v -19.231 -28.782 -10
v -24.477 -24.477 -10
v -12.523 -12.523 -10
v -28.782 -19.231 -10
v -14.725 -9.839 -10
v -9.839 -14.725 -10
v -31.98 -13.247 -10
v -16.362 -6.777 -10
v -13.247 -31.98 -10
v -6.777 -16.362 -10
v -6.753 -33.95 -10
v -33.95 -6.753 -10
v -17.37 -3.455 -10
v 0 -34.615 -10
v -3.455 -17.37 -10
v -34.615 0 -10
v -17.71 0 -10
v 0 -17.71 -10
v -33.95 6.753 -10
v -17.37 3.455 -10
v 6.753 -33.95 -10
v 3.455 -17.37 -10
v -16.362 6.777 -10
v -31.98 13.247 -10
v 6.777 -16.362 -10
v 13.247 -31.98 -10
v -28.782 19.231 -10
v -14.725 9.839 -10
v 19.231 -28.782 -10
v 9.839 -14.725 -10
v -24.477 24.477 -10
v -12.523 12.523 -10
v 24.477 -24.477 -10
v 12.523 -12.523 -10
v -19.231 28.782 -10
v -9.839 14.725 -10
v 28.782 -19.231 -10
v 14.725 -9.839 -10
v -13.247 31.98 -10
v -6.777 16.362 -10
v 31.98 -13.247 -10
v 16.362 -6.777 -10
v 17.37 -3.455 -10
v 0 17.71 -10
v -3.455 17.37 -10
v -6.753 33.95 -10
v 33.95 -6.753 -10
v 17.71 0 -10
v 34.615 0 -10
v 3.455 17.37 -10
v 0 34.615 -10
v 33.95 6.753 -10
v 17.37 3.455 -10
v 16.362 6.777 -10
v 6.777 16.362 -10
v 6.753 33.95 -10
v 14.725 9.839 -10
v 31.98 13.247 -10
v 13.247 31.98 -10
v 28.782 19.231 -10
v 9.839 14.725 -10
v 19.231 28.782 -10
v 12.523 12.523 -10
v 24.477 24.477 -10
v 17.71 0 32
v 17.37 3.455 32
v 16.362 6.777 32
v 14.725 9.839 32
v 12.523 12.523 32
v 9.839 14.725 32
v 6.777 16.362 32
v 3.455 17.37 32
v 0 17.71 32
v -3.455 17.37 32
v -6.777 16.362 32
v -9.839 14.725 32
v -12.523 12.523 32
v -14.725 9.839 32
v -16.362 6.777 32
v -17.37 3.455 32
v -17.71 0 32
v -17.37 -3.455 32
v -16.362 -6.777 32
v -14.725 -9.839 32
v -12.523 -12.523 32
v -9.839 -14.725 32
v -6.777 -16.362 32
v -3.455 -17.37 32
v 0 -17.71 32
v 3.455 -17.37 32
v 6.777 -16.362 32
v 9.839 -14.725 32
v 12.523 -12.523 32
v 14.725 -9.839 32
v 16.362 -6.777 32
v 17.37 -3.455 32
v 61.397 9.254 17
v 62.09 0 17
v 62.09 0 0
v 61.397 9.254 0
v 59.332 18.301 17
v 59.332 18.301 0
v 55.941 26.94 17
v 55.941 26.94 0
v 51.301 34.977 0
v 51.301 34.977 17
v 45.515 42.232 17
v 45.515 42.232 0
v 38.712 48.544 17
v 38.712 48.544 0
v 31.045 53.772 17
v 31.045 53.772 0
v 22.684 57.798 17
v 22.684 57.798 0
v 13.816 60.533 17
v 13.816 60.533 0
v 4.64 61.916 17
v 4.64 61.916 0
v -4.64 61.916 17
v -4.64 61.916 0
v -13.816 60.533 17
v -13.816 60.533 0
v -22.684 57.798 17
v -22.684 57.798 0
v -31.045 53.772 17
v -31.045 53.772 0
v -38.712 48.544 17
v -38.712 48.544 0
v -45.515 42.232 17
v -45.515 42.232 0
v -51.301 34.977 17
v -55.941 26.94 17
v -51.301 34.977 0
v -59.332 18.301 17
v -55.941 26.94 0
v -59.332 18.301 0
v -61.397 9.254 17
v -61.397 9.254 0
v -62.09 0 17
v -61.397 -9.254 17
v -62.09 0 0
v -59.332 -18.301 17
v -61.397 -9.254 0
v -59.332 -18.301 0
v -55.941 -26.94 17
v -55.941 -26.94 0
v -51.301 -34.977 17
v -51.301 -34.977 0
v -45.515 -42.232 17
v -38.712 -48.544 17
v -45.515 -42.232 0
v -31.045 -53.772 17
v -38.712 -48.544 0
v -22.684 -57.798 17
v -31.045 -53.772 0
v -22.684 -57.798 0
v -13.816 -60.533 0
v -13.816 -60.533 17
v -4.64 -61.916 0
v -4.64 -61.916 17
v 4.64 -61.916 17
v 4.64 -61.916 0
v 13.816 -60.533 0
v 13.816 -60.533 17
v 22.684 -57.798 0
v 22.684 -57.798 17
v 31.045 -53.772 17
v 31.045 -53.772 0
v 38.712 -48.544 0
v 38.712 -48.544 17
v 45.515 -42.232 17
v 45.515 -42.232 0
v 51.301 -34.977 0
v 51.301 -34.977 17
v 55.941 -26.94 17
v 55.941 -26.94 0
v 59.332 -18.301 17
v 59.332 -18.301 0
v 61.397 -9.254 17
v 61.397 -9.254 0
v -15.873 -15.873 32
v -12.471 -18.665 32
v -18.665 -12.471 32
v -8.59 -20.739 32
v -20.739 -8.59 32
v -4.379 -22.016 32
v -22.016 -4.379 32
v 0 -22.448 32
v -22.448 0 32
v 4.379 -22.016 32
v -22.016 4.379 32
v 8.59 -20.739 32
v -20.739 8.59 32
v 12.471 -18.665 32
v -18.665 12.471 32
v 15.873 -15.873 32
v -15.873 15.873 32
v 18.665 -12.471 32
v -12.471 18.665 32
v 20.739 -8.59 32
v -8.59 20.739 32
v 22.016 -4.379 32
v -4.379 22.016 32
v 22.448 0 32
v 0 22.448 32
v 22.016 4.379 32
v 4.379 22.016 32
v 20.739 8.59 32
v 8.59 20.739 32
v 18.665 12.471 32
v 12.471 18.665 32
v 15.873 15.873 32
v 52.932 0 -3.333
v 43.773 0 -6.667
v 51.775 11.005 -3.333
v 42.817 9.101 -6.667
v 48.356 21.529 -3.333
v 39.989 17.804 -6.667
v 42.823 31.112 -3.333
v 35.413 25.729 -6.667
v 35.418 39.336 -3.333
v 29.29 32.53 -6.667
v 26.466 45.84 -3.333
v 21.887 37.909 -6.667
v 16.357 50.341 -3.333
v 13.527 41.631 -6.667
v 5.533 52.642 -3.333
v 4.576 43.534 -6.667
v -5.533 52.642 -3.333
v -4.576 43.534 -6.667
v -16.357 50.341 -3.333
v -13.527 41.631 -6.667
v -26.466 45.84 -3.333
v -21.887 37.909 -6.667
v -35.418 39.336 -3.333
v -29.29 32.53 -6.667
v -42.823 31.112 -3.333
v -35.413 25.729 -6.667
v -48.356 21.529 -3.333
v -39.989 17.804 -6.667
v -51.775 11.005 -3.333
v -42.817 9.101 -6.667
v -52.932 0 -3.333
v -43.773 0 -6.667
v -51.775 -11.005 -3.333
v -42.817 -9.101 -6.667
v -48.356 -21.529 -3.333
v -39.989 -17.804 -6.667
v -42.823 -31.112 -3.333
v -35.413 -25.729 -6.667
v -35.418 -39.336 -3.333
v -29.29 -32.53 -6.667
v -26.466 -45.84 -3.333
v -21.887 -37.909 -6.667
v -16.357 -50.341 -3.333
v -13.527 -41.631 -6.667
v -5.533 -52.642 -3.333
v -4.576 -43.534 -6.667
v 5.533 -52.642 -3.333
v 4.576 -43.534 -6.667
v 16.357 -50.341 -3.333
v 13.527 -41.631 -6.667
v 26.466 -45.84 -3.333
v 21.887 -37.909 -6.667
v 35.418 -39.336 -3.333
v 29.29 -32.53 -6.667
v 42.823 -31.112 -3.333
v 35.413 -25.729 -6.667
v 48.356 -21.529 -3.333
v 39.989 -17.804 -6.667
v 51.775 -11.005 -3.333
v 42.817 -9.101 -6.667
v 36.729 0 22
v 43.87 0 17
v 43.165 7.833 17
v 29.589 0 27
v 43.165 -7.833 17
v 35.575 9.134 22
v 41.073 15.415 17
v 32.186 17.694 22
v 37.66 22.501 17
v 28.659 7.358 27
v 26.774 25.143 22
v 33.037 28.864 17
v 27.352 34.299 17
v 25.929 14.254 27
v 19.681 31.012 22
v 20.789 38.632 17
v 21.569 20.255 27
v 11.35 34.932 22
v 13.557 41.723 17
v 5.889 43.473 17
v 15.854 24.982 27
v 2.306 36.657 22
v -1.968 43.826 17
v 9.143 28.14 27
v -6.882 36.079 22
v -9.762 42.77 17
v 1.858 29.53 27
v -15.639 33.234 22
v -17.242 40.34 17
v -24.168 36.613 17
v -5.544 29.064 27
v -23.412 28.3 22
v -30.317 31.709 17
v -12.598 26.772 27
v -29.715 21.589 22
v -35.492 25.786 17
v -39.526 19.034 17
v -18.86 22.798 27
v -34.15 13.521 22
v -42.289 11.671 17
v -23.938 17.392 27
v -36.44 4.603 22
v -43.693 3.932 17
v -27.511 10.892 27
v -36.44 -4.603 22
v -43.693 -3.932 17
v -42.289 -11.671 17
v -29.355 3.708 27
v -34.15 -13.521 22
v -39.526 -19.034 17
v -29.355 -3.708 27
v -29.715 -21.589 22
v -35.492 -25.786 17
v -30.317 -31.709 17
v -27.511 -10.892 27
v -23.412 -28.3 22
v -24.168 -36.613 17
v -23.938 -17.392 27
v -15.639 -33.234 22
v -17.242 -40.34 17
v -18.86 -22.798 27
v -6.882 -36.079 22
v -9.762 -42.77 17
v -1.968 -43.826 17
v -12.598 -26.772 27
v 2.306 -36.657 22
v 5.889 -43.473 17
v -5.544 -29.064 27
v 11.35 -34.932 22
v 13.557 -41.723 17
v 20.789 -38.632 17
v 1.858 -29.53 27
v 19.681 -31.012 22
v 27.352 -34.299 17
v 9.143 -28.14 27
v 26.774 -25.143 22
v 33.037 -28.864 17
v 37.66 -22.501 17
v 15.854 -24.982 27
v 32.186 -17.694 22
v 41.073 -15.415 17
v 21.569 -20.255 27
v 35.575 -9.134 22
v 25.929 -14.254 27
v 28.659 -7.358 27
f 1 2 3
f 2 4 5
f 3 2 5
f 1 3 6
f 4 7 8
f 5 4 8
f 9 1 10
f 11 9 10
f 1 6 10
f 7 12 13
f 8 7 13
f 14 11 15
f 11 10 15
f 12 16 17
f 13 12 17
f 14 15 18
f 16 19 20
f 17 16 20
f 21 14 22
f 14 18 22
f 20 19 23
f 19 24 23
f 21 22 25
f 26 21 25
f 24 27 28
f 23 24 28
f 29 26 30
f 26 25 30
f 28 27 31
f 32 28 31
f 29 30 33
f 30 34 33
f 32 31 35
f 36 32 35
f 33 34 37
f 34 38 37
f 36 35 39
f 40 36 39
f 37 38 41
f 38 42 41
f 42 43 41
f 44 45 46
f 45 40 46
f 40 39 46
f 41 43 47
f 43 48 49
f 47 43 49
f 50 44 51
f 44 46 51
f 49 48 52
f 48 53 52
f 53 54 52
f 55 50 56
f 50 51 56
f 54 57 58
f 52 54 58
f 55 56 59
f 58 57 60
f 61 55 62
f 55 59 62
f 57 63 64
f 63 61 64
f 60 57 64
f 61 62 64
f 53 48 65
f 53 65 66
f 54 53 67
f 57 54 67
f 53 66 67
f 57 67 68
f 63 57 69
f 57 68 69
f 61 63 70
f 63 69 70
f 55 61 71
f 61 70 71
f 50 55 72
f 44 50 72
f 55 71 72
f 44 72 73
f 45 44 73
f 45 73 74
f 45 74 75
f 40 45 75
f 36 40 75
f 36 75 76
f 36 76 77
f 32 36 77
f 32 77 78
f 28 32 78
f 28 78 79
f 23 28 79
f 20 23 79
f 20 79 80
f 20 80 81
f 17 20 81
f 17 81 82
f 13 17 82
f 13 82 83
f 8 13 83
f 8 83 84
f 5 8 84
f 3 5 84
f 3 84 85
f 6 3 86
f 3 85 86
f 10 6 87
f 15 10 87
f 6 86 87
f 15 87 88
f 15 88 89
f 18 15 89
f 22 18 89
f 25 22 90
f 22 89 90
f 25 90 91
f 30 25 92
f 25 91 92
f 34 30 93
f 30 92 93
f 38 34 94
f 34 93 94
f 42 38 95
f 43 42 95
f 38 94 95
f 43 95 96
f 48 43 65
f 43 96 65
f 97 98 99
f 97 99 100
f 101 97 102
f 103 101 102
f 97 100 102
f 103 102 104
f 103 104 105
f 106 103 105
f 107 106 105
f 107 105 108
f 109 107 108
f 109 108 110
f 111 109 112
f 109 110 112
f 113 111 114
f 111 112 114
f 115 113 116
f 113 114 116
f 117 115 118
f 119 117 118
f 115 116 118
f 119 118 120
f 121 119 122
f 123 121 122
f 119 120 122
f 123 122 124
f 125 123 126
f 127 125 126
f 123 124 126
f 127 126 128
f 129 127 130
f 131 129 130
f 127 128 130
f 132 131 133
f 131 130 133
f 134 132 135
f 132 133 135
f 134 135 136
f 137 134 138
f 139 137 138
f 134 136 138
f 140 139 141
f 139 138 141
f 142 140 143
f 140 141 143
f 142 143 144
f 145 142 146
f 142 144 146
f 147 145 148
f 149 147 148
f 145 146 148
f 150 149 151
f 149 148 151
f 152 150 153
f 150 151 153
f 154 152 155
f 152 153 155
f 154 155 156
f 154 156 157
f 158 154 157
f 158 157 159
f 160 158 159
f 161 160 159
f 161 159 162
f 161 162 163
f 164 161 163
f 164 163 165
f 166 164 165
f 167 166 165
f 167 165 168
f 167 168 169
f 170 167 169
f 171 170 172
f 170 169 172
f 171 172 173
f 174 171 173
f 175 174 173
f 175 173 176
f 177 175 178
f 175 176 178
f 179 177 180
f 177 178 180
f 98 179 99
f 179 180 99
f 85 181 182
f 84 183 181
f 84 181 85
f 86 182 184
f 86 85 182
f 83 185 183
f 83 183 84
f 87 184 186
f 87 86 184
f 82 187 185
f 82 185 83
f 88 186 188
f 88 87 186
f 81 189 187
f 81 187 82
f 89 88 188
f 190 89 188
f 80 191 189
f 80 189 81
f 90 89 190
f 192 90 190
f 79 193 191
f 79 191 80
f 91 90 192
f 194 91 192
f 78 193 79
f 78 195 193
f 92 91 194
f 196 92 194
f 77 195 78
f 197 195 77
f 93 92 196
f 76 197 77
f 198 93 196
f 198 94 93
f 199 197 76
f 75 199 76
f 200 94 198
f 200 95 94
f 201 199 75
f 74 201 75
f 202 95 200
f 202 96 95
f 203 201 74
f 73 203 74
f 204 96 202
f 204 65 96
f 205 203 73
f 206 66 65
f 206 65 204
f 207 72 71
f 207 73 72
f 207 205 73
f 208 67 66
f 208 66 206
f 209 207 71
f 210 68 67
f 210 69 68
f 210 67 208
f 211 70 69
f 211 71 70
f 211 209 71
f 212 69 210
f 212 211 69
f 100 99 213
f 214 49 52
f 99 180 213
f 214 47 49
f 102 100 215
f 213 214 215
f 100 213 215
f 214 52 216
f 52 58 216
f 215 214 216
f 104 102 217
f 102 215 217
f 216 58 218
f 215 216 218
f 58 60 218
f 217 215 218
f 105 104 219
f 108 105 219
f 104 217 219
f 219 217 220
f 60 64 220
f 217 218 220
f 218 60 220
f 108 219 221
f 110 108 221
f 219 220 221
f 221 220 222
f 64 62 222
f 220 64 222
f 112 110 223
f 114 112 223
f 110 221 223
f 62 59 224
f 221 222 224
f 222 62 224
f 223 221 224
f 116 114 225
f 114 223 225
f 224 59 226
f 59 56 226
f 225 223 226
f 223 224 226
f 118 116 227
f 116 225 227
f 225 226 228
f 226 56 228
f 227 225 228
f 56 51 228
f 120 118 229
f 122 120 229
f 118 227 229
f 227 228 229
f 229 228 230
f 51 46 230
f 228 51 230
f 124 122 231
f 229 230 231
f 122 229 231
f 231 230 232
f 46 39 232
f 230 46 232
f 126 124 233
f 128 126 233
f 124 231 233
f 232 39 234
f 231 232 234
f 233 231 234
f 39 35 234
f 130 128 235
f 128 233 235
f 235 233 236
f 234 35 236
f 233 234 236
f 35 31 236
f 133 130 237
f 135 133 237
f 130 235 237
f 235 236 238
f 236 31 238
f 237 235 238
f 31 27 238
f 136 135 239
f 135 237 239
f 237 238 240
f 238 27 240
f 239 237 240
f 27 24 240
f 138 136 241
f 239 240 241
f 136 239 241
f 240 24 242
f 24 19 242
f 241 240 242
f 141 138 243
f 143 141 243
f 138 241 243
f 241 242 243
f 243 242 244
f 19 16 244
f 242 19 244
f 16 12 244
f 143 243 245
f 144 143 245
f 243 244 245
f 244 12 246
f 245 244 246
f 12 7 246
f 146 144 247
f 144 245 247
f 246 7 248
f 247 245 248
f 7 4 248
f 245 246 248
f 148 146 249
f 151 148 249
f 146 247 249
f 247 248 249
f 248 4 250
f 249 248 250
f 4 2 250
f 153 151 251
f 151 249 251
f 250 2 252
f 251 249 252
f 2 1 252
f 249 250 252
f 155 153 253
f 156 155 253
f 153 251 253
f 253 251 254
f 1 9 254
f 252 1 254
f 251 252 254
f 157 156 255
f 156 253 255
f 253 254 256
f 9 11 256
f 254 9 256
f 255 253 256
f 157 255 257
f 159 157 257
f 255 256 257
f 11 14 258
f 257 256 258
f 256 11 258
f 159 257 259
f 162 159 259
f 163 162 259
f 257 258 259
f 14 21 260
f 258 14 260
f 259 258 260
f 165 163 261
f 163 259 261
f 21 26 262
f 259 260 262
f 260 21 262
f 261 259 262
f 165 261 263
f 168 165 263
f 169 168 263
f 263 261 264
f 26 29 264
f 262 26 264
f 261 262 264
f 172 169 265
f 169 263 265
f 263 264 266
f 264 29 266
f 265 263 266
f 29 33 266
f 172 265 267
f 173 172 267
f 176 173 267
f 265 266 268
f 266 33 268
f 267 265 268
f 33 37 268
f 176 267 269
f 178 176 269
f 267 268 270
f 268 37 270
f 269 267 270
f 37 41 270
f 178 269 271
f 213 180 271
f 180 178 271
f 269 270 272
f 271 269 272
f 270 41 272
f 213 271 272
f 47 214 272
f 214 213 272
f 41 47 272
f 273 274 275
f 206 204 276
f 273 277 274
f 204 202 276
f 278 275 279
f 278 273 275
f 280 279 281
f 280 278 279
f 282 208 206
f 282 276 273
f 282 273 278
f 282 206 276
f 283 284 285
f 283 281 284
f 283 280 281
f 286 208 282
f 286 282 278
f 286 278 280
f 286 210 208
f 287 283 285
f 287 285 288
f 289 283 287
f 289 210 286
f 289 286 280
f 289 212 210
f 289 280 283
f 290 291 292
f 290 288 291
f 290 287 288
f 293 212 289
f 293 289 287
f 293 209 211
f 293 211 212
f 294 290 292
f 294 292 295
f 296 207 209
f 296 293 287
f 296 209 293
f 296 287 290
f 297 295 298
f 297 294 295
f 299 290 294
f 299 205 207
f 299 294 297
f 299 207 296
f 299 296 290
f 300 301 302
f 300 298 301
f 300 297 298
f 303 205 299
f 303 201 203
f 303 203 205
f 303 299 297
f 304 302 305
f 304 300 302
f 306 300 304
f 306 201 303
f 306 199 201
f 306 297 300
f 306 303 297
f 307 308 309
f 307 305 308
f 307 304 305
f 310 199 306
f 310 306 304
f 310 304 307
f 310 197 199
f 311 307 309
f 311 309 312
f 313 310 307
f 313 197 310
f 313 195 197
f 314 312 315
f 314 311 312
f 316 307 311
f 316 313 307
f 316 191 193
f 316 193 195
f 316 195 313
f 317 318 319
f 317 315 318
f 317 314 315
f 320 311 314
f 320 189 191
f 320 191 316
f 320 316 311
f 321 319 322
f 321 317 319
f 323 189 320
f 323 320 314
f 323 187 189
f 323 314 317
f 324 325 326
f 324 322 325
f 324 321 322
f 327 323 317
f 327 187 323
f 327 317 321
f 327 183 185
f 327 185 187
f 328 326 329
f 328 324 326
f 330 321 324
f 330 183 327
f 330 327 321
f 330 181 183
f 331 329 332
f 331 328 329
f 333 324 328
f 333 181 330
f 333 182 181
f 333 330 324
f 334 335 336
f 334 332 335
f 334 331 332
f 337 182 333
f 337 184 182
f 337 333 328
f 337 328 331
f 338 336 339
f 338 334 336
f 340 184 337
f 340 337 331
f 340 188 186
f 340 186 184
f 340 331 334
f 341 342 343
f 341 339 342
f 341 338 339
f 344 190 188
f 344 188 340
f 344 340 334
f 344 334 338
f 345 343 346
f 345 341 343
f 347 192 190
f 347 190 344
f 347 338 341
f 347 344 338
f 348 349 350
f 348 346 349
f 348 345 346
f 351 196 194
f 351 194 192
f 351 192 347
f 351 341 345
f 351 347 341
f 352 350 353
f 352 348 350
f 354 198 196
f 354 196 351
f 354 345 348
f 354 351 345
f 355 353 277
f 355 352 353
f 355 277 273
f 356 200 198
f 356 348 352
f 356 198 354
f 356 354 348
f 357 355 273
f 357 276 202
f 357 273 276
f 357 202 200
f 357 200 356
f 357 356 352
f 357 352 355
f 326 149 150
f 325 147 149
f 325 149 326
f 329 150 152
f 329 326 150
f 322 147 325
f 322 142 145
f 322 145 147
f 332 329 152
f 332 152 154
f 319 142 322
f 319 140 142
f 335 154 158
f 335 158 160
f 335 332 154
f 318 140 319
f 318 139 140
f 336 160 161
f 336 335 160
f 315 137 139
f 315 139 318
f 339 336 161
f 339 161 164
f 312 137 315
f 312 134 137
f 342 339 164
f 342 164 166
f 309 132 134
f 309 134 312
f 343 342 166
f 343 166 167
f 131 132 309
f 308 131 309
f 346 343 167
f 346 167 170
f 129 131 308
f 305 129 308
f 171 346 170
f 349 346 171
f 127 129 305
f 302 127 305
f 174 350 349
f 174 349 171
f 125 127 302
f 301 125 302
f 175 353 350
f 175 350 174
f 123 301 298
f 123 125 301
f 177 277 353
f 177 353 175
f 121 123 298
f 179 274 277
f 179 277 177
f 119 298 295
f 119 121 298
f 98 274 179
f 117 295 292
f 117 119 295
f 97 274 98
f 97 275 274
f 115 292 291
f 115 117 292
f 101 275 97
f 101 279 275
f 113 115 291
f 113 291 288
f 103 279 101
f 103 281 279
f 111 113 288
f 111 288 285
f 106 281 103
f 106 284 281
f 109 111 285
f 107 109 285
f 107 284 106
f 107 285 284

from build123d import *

# Parameters (mm, degrees)
SKETCH1_R                     = 62.09
BOSS_EXTRUDE1_DEPTH           = 17
BOSS_EXTRUDE1_OTHER_WAY_DEPTH = 10
BOSS_EXTRUDE1_OTHER_WAY_TAPER = 70
SKETCH2_R                     = 43.87
BOSS_EXTRUDE2_DEPTH           = 15
BOSS_EXTRUDE2_TAPER           = 55
SKETCH3_R                     = 17.71
CUT_EXTRUDE1_DEPTH            = 98.336202069


with BuildPart() as part:
    # Sketch1 → Boss-Extrude1 (new body)
    with BuildSketch(Plane.XY):
        Circle(SKETCH1_R)
    extrude(amount=BOSS_EXTRUDE1_DEPTH)

    # Sketch1 → Boss-Extrude1 other way (add)
    with BuildSketch(Plane.XY):
        Circle(SKETCH1_R)
    extrude(amount=-BOSS_EXTRUDE1_OTHER_WAY_DEPTH, taper=BOSS_EXTRUDE1_OTHER_WAY_TAPER)

    # Sketch2 → Boss-Extrude2 (add)
    with BuildSketch(Plane.XY.offset(17)):
        Circle(SKETCH2_R)
    extrude(amount=BOSS_EXTRUDE2_DEPTH, taper=BOSS_EXTRUDE2_TAPER)

    # Sketch3 → Cut-Extrude1 (cut, through all)
    with BuildSketch(Plane.XY.offset(32)):
        Circle(SKETCH3_R)
    extrude(amount=-CUT_EXTRUDE1_DEPTH, mode=Mode.SUBTRACT)


solid = part.part
